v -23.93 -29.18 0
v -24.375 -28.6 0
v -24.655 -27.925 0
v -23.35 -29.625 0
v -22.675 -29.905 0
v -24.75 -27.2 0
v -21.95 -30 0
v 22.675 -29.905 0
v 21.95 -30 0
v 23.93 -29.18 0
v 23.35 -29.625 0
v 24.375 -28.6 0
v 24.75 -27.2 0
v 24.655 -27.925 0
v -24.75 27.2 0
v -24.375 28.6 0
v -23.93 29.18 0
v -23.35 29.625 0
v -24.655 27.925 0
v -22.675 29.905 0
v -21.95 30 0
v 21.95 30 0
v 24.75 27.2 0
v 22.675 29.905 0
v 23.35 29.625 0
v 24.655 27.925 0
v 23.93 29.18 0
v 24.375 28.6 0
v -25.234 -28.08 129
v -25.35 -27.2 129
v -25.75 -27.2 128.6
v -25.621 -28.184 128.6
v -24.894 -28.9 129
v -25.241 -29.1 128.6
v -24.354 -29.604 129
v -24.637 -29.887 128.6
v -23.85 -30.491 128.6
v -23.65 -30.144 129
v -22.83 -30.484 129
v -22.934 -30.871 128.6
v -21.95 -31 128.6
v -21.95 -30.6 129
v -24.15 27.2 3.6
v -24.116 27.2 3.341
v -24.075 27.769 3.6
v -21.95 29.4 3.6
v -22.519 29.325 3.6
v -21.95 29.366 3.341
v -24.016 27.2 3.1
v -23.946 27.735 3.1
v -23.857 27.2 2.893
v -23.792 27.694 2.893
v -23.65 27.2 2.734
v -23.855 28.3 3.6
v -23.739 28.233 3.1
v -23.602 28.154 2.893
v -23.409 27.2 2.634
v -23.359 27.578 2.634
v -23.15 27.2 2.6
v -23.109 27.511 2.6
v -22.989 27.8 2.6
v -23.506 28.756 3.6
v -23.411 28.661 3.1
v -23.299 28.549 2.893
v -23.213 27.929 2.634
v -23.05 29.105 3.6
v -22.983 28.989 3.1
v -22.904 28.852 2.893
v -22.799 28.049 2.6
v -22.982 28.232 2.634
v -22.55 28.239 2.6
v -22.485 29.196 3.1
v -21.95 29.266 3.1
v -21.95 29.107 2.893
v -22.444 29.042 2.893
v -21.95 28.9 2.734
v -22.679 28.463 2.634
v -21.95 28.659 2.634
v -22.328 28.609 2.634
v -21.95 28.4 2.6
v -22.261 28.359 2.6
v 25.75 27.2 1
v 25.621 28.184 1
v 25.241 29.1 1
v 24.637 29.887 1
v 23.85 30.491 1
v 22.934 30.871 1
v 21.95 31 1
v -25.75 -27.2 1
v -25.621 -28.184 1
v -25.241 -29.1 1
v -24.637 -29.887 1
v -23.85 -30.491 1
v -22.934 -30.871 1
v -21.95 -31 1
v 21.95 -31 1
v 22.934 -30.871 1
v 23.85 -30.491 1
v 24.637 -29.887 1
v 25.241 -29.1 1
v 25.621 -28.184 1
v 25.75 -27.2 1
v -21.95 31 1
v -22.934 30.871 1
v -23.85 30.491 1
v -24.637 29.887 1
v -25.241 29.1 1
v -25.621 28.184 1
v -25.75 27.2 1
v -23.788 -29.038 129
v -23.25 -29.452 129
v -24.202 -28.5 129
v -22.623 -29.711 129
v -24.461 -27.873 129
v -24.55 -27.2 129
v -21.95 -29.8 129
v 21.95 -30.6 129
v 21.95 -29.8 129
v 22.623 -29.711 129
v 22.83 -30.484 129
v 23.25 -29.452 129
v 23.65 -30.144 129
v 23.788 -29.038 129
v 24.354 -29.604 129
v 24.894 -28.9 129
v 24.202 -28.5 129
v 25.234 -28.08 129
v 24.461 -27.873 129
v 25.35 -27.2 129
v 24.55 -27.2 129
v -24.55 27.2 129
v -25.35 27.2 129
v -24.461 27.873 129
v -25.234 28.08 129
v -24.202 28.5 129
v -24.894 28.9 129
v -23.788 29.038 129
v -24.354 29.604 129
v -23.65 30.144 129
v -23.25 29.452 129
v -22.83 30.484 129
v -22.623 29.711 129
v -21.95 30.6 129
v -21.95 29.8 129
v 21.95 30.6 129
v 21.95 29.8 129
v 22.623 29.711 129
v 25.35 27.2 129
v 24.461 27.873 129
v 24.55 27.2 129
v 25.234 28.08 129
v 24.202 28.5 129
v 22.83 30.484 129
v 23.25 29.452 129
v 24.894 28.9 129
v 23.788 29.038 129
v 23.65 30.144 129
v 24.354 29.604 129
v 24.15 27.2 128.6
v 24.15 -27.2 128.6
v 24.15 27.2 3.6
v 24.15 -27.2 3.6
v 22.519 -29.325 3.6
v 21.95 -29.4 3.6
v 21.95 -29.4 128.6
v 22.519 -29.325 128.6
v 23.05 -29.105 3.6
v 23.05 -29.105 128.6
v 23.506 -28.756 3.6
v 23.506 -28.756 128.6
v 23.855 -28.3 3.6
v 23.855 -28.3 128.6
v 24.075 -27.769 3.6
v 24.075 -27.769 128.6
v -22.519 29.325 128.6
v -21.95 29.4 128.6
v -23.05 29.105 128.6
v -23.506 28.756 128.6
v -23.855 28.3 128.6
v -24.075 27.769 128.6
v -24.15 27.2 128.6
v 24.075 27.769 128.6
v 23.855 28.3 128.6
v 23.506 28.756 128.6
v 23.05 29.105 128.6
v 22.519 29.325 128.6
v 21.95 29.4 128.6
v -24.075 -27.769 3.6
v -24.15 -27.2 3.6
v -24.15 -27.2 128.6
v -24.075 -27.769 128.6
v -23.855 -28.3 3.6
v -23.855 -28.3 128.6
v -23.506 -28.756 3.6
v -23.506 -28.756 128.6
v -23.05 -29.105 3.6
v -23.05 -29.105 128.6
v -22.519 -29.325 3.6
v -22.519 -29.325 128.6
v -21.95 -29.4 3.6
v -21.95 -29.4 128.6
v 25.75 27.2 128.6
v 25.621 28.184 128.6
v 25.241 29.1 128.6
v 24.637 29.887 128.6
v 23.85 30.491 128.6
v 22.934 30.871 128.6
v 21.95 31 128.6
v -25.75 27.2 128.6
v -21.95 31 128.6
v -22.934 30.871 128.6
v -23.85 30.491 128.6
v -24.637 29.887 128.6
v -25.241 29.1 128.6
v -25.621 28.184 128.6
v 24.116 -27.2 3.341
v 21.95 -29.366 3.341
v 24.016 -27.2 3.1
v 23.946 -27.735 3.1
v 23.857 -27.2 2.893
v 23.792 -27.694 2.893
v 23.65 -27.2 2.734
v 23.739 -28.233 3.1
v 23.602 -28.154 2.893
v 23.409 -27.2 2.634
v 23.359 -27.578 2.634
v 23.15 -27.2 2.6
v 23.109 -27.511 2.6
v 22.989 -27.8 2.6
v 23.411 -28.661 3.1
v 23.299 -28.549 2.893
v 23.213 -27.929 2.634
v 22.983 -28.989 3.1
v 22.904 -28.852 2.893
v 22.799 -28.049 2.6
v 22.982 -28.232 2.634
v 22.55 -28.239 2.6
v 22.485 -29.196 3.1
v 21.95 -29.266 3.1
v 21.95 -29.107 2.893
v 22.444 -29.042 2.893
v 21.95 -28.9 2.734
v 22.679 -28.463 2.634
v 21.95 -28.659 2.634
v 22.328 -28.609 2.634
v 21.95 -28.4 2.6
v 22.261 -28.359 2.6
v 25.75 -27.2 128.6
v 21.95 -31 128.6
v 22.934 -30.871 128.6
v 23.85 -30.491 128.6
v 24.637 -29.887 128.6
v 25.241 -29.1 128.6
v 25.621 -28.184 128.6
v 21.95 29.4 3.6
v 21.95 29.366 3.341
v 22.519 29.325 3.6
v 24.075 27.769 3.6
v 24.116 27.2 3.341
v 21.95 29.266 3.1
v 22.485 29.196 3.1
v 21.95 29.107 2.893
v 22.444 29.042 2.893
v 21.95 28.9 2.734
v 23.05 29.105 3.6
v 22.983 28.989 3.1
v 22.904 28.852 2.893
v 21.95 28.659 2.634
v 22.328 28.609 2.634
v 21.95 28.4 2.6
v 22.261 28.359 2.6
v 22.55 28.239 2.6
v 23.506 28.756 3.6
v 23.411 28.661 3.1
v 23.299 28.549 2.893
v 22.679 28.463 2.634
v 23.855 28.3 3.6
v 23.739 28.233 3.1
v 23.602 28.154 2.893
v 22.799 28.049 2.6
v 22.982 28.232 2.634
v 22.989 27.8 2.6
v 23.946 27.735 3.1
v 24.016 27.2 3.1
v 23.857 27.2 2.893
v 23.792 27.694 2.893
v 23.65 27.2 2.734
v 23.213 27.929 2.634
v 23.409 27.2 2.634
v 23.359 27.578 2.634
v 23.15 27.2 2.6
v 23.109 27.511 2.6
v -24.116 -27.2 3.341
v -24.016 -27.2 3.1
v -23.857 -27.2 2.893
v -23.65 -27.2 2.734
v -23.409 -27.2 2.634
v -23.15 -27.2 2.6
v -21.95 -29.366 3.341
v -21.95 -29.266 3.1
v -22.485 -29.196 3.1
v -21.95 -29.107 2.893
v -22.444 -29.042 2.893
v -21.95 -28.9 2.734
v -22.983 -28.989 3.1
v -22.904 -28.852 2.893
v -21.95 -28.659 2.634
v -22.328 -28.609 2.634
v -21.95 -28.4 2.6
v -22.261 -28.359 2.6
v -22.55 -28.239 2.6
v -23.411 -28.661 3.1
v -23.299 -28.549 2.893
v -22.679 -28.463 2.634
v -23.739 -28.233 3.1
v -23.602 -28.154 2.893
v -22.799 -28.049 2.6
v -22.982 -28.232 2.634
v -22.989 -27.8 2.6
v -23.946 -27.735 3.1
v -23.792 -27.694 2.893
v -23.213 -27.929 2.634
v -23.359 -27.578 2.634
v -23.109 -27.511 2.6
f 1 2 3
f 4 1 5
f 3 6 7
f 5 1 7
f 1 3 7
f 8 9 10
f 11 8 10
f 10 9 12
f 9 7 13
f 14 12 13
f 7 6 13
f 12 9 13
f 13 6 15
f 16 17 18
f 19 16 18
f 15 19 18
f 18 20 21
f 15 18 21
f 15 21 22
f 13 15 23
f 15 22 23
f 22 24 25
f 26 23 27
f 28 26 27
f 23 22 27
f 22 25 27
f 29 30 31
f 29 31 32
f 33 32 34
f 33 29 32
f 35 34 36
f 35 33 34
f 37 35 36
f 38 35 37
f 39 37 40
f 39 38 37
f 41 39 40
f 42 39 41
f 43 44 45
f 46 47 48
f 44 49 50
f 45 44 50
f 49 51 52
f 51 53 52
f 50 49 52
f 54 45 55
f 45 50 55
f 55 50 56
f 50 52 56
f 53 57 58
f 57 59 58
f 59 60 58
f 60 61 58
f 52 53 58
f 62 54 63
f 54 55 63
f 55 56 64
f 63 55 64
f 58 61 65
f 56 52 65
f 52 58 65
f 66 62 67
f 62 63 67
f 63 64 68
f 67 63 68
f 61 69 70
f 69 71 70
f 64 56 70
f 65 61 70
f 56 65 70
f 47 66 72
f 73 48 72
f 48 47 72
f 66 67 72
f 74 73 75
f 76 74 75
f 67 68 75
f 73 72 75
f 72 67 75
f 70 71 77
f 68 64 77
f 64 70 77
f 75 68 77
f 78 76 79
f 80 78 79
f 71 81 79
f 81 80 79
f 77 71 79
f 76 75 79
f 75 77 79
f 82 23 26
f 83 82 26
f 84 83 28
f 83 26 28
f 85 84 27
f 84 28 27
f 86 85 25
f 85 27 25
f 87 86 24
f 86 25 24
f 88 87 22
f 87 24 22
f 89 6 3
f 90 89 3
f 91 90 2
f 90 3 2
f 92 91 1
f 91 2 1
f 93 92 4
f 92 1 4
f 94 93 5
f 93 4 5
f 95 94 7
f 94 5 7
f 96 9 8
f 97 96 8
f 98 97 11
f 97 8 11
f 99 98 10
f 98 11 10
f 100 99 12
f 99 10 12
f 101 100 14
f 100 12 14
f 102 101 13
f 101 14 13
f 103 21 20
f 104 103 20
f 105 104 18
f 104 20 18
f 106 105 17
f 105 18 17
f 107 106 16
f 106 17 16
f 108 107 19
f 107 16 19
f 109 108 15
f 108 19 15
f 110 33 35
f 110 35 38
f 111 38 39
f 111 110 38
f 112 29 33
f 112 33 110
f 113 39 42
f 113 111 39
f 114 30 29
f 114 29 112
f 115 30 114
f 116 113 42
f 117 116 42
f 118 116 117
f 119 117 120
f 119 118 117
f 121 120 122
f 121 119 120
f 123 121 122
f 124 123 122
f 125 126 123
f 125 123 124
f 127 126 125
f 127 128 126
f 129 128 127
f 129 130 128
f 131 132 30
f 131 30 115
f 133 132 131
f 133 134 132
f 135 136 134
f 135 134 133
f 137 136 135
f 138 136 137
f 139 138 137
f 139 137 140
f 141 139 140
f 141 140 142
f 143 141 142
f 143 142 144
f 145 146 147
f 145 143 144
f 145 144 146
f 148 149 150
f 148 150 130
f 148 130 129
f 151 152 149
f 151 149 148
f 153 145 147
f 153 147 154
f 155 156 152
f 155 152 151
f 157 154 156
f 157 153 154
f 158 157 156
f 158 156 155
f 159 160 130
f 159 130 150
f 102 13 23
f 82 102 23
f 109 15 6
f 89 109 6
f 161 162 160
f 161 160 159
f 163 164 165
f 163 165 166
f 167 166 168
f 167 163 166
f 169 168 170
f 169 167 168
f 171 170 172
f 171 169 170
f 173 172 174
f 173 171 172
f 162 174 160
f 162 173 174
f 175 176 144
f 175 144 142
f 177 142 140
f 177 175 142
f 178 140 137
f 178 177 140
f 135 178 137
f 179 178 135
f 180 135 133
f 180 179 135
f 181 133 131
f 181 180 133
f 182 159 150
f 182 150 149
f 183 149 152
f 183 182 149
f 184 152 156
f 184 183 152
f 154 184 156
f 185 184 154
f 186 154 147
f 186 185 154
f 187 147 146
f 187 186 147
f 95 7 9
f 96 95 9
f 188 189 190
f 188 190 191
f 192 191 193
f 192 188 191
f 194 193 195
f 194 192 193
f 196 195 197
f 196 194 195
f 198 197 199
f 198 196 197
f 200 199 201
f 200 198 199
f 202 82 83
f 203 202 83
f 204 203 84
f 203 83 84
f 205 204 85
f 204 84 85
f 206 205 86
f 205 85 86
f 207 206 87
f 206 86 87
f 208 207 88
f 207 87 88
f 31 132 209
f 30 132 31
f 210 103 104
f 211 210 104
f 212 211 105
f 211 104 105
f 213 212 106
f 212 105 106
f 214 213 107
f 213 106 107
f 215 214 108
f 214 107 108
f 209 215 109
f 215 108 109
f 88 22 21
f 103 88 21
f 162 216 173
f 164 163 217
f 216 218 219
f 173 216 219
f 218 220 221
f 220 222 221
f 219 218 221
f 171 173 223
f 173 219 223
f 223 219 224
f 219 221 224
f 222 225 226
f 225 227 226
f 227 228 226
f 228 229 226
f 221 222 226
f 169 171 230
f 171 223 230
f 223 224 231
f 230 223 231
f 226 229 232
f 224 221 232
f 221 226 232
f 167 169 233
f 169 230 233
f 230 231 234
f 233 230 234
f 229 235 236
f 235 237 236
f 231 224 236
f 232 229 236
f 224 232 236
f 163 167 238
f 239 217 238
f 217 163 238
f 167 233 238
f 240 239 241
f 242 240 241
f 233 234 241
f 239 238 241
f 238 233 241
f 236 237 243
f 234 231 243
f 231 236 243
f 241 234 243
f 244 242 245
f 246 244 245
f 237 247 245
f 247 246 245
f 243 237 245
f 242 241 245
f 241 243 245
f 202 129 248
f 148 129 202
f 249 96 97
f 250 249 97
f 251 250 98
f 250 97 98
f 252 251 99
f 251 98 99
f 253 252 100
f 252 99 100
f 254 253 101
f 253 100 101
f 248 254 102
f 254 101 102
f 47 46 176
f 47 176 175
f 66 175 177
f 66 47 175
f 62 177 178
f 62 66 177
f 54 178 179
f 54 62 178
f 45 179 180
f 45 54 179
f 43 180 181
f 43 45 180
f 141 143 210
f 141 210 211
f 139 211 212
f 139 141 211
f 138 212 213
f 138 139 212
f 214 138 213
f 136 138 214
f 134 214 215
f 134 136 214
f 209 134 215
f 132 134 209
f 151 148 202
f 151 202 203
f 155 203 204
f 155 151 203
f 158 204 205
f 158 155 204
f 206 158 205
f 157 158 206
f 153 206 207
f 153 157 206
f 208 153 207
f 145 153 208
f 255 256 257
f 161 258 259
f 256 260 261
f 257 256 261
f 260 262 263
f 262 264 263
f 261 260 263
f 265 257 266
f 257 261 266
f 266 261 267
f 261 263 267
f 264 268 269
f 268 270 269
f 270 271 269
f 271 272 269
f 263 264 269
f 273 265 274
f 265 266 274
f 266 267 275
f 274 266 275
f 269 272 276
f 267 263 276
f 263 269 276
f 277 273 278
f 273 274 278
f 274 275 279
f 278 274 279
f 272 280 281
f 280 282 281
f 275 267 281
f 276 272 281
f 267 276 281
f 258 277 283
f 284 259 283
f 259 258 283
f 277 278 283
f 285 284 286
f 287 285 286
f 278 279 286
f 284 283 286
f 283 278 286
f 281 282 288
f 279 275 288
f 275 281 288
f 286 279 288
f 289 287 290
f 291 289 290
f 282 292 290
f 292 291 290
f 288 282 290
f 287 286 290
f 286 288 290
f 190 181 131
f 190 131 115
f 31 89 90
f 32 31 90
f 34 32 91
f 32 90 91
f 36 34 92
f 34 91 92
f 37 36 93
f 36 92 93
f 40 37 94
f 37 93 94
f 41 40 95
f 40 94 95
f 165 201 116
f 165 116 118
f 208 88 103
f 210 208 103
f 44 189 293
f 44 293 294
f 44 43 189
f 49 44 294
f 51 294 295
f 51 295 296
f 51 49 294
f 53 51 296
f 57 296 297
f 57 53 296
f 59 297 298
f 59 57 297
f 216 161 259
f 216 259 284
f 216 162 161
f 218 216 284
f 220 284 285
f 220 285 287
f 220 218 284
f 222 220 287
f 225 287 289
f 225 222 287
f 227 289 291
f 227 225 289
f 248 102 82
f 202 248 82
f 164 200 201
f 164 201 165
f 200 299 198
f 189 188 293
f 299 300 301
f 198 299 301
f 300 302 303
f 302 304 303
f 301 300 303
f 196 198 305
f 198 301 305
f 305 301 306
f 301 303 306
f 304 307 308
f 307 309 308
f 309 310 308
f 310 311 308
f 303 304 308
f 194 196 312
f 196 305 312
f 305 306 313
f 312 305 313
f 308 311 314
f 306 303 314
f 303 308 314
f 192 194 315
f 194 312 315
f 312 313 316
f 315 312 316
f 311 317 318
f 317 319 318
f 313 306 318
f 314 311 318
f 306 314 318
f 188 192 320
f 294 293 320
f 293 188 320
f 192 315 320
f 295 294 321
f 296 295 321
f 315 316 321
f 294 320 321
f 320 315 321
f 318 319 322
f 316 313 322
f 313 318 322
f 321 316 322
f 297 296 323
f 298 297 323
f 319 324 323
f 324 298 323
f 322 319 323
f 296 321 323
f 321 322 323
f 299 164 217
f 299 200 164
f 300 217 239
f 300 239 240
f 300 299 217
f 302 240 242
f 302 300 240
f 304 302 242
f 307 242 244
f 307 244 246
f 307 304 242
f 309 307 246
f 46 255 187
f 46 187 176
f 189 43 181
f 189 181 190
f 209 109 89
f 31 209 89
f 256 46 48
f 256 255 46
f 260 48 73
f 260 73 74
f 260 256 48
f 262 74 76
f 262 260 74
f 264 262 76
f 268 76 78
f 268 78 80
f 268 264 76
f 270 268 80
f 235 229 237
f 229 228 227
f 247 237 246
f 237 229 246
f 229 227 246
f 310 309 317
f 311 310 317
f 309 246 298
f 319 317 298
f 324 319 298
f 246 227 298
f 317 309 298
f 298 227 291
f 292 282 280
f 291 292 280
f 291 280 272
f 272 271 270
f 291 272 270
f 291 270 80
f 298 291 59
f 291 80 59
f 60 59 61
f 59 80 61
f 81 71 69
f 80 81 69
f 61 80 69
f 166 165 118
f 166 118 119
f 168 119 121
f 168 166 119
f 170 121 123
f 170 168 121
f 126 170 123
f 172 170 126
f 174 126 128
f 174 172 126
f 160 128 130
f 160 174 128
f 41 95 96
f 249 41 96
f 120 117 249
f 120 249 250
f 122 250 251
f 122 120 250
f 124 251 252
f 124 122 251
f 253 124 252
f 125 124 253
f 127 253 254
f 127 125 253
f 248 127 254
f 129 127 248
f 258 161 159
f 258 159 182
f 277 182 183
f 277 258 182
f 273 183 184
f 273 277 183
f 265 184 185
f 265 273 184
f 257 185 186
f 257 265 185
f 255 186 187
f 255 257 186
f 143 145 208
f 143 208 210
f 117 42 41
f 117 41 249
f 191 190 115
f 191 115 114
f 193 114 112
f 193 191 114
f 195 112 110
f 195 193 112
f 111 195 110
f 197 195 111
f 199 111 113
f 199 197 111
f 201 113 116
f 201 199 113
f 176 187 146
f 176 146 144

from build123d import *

# Parameters (mm, degrees)
WALLS_DEPTH            = 129
FLOOR_2_DEPTH          = 2.6
BOTTOM_CHAMFERS_SIZE   = 1
TOP_CHAMFERS_SIZE      = 0.4
INSIDE_BOTTOM_FILLET_R = 1


with BuildPart() as part:
    # Sketch1 → Walls (new body)
    with BuildSketch(Plane.XY):
        with BuildLine():
            Line((-25.75, 27.2), (-25.75, -27.2))
            ThreePointArc((-25.75, -27.2), (-24.637005769, -29.887005769), (-21.95, -31))
            Line((-21.95, -31), (21.95, -31))
            ThreePointArc((21.95, -31), (24.637005769, -29.887005769), (25.75, -27.2))
            Line((25.75, -27.2), (25.75, 27.2))
            ThreePointArc((25.75, 27.2), (24.637005769, 29.887005769), (21.95, 31))
            Line((21.95, 31), (-21.95, 31))
            ThreePointArc((-21.95, 31), (-24.637005769, 29.887005769), (-25.75, 27.2))
        make_face()
        with BuildLine():
            Line((-24.15, 27.2), (-24.15, -27.2))
            ThreePointArc((-24.15, -27.2), (-23.505634919, -28.755634919), (-21.95, -29.4))
            Line((-21.95, -29.4), (21.95, -29.4))
            ThreePointArc((21.95, -29.4), (23.505634919, -28.755634919), (24.15, -27.2))
            Line((24.15, -27.2), (24.15, 27.2))
            ThreePointArc((24.15, 27.2), (23.505634919, 28.755634919), (21.95, 29.4))
            Line((21.95, 29.4), (-21.95, 29.4))
            ThreePointArc((-21.95, 29.4), (-23.505634919, 28.755634919), (-24.15, 27.2))
        make_face(mode=Mode.SUBTRACT)
    extrude(amount=WALLS_DEPTH)

    # Sketch2 → Floor 2 (add)
    with BuildSketch(Plane(origin=(0, 0, 0), x_dir=(-1, 0, 0), z_dir=(0, 0, -1))):
        with BuildLine():
            Line((-25.75, 27.2), (-25.75, -27.2))
            ThreePointArc((-25.75, -27.2), (-24.637005769, -29.887005769), (-21.95, -31))
            Line((-21.95, -31), (21.95, -31))
            ThreePointArc((21.95, -31), (24.637005769, -29.887005769), (25.75, -27.2))
            Line((25.75, -27.2), (25.75, 27.2))
            ThreePointArc((25.75, 27.2), (24.637005769, 29.887005769), (21.95, 31))
            Line((21.95, 31), (-21.95, 31))
            ThreePointArc((-21.95, 31), (-24.637005769, 29.887005769), (-25.75, 27.2))
        make_face()
    extrude(amount=-FLOOR_2_DEPTH)

    # Bottom Chamfers
    bottom_chamfers_edges = [part.edges().sort_by_distance(p)[0] for p in [
        (25.75, 0, 0),
        (24.637005769, -29.887005769, 0),
        (0, -31, 0),
        (-24.637005769, -29.887005769, 0),
        (-25.75, 0, 0),
        (-24.637005769, 29.887005769, 0),
        (0, 31, 0),
        (24.637005769, 29.887005769, 0),
    ]]
    chamfer(bottom_chamfers_edges, length=BOTTOM_CHAMFERS_SIZE)

    # Top Chamfers
    top_chamfers_edges = [part.edges().sort_by_distance(p)[0] for p in [
        (-24.637005769, 29.887005769, 129),
        (-25.75, 0, 129),
        (-24.637005769, -29.887005769, 129),
        (0, -31, 129),
        (23.505634919, 28.755634919, 129),
        (0, 29.4, 129),
        (-23.505634919, 28.755634919, 129),
        (-24.15, 0, 129),
        (-23.505634919, -28.755634919, 129),
        (24.637005769, -29.887005769, 129),
        (0, -29.4, 129),
        (23.505634919, -28.755634919, 129),
        (24.15, 0, 129),
        (25.75, 0, 129),
        (24.637005769, 29.887005769, 129),
        (0, 31, 129),
    ]]
    chamfer(top_chamfers_edges, length=TOP_CHAMFERS_SIZE)

    # Inside Bottom Fillet
    inside_bottom_fillet_edges = [part.edges().sort_by_distance(p)[0] for p in [
        (24.15, 0, 2.6),
        (0, 29.4, 2.6),
        (23.505634919, 28.755634919, 2.6),
        (23.505634919, -28.755634919, 2.6),
        (0, -29.4, 2.6),
        (-23.505634919, -28.755634919, 2.6),
        (-24.15, 0, 2.6),
        (-23.505634919, 28.755634919, 2.6),
    ]]
    fillet(inside_bottom_fillet_edges, radius=INSIDE_BOTTOM_FILLET_R)


solid = part.part
